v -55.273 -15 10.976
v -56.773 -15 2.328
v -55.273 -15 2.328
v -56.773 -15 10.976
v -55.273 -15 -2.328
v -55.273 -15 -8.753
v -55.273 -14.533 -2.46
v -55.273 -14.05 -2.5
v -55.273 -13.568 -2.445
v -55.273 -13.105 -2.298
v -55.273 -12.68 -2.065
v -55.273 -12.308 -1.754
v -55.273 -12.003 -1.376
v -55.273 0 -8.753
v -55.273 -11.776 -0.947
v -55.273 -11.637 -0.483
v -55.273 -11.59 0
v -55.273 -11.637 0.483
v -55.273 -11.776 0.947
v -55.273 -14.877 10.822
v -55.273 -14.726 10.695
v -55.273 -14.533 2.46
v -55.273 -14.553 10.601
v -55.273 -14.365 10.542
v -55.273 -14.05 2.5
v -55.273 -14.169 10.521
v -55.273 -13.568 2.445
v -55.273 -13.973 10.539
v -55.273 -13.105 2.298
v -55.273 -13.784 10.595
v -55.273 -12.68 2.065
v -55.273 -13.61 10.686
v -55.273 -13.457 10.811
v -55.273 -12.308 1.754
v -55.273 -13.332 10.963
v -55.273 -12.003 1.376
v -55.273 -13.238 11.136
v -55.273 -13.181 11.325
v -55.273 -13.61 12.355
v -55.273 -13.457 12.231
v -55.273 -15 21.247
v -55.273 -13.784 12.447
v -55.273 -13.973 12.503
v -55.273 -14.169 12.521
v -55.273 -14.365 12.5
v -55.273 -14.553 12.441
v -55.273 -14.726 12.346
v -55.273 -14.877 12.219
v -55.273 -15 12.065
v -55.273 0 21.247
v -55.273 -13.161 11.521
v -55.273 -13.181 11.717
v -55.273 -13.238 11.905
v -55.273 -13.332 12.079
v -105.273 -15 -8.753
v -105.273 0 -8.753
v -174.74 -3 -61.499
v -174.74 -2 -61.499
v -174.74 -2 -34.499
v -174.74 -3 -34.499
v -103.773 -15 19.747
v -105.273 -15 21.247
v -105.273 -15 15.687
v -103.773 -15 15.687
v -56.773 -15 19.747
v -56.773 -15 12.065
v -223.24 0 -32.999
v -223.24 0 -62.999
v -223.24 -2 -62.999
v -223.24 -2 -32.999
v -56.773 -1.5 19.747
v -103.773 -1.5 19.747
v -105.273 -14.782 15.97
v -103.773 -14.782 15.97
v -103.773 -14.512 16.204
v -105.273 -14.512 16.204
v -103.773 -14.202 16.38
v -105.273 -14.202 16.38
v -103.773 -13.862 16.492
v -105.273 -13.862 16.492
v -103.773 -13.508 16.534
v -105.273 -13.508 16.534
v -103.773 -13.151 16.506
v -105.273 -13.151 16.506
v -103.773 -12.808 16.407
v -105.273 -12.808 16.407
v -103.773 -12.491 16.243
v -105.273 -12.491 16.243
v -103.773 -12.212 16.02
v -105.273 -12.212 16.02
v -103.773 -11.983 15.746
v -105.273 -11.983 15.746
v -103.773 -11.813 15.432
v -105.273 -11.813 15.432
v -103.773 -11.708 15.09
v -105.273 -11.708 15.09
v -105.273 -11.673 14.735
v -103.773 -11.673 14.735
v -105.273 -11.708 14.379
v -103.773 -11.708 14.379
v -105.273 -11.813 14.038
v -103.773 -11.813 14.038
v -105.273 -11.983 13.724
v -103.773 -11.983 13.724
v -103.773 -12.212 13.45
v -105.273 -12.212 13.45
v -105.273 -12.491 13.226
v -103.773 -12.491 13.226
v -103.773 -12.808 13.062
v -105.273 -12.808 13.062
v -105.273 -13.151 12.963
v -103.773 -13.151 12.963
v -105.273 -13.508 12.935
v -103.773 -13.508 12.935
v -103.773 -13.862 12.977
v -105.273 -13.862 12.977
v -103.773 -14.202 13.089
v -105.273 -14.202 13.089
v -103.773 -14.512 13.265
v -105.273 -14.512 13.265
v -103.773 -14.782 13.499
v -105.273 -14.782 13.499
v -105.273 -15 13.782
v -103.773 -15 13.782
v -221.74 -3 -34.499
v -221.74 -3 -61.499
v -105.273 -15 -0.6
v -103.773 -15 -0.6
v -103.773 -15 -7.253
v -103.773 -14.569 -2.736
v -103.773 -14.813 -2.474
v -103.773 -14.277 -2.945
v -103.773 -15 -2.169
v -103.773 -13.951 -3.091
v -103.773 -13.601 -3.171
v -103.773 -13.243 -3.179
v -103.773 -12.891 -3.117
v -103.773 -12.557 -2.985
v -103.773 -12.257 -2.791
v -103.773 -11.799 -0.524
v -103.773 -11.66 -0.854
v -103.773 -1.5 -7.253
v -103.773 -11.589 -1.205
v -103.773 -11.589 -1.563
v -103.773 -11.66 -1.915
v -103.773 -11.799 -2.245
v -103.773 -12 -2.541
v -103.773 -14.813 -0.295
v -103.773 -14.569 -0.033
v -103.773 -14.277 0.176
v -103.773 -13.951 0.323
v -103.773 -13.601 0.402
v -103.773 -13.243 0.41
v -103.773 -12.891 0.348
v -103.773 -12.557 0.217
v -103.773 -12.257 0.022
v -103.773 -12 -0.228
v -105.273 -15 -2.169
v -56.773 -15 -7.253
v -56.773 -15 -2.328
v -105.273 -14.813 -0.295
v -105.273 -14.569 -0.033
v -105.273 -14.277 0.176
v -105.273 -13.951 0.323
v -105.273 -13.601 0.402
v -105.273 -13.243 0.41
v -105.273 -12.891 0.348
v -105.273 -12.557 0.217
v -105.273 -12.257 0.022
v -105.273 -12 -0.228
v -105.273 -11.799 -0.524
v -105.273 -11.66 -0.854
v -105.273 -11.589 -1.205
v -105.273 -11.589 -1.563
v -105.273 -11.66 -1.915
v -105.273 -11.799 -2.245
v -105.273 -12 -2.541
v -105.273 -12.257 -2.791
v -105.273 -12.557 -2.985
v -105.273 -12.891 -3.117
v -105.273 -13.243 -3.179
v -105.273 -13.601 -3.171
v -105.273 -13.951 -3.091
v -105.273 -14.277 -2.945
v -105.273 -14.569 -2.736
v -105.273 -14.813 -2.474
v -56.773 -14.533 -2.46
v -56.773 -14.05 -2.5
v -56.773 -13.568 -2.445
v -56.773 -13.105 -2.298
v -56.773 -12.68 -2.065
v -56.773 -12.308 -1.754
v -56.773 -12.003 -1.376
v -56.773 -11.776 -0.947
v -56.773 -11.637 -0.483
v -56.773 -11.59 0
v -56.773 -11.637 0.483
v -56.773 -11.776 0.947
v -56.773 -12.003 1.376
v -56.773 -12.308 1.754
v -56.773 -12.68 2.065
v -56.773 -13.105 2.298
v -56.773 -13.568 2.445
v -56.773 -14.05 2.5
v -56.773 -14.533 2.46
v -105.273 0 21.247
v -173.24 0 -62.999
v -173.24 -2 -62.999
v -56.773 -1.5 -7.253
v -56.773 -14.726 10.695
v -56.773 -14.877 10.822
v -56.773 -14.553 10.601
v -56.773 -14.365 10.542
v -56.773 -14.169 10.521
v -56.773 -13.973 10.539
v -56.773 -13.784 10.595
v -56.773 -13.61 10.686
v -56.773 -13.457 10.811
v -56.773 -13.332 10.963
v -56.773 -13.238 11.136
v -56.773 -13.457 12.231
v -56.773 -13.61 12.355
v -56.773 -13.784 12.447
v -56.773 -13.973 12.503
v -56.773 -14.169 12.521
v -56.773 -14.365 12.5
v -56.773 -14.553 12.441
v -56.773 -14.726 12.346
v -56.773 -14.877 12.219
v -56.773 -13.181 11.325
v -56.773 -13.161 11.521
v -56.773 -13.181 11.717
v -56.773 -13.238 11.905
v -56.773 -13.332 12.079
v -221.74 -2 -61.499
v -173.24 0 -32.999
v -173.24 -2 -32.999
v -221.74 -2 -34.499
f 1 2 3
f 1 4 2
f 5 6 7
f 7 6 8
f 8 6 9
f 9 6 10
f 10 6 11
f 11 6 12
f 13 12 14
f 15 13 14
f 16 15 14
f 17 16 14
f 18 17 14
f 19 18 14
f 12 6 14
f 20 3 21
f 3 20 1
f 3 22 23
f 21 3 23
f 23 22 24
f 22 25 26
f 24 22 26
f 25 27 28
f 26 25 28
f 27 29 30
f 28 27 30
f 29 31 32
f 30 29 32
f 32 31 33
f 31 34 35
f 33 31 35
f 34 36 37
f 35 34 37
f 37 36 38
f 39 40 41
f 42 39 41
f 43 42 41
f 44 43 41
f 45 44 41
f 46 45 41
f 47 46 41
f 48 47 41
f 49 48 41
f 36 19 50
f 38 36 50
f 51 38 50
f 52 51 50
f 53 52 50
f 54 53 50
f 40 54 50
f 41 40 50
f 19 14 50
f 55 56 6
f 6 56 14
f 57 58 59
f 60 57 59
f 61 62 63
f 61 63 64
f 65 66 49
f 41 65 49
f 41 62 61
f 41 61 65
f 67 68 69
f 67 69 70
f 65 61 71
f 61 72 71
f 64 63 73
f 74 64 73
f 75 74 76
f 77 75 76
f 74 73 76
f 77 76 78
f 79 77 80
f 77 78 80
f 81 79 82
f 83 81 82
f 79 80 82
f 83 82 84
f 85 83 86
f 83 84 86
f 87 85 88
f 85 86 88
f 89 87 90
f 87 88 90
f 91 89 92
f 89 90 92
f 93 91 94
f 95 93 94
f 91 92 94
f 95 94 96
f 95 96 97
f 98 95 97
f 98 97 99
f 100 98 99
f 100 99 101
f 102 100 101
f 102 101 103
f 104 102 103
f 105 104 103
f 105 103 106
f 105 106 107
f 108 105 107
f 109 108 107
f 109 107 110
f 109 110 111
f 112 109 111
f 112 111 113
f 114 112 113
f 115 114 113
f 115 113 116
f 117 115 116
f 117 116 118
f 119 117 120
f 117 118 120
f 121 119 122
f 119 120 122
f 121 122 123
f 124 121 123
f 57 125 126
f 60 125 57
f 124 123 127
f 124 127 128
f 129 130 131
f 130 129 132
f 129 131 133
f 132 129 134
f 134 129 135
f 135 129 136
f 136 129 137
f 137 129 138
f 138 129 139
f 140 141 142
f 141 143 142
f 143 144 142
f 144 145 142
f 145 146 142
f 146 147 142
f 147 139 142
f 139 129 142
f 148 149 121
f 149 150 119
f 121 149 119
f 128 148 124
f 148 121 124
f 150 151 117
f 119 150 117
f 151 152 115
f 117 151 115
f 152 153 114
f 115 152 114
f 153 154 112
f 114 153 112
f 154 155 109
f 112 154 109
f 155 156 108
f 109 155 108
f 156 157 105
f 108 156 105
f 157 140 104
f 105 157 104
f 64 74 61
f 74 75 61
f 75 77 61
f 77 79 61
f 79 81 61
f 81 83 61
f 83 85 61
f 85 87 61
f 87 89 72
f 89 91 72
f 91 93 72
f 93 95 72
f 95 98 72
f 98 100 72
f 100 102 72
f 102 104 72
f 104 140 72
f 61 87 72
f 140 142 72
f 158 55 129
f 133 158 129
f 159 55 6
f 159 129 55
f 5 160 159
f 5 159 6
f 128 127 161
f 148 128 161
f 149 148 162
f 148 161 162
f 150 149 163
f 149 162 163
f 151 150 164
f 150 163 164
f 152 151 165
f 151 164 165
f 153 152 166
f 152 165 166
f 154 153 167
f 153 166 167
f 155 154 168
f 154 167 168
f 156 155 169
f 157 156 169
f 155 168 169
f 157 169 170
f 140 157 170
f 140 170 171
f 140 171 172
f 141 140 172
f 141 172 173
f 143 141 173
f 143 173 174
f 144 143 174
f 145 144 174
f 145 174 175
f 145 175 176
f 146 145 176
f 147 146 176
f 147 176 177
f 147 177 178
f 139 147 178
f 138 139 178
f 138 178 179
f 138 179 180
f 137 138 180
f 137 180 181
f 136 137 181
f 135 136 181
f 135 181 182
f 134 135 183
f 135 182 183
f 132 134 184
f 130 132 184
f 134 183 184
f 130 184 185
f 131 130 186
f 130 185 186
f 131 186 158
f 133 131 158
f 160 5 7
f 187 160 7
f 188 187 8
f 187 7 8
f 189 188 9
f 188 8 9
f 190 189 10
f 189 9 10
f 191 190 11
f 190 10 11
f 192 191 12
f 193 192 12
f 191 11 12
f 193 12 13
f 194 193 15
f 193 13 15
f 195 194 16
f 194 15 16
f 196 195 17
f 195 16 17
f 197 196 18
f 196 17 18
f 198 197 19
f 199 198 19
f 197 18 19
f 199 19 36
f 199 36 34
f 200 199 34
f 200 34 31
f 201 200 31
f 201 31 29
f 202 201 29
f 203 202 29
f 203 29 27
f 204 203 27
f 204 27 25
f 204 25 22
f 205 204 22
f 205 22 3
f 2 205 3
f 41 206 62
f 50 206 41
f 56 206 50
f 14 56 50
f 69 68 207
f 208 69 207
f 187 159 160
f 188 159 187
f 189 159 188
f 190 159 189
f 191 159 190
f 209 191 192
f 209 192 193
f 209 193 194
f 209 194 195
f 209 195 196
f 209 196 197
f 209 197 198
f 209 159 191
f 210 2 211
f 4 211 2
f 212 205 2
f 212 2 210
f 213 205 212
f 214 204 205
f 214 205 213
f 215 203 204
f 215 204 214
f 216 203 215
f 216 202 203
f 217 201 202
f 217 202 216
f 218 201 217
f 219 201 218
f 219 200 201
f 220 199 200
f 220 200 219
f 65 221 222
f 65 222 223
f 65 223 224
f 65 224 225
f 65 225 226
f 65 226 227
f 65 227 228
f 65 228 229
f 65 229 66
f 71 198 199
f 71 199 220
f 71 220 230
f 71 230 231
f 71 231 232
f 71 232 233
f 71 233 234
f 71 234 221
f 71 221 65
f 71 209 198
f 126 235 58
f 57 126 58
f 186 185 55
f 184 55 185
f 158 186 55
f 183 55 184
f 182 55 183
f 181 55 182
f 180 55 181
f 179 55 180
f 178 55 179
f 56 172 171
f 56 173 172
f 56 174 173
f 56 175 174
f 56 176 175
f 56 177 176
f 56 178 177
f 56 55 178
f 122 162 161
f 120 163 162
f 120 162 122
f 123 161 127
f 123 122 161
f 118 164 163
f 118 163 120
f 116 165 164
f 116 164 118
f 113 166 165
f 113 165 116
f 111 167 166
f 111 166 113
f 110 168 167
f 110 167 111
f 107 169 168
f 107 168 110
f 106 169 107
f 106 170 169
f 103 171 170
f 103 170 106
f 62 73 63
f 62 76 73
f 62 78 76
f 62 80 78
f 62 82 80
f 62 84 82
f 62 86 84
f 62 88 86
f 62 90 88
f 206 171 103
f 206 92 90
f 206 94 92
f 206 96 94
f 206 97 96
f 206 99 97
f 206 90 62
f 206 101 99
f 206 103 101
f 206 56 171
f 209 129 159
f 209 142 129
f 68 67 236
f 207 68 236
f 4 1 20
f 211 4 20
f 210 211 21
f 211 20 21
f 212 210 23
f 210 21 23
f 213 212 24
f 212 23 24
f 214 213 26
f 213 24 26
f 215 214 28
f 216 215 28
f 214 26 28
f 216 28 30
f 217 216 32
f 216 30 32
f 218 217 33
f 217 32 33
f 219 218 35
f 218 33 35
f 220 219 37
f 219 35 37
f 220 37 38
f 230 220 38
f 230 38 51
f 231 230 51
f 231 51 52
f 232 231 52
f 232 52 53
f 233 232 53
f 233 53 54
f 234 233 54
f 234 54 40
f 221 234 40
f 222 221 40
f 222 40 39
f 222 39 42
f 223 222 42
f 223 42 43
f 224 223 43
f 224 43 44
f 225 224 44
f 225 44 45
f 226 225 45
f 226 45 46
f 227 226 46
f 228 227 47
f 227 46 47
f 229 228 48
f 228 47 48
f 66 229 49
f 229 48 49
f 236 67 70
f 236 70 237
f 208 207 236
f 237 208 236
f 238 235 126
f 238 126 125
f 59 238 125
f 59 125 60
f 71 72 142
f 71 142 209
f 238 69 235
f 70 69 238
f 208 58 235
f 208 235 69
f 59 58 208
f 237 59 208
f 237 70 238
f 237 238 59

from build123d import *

# Parameters (mm, degrees)
F0_W     = 50
F0_H     = 30
F1_DEPTH = 15
F2_T     = -1.5
F3_DEPTH = 2
F4_T     = -1.5
F5_DEPTH = 1.5
F7_DEPTH = 5
F9_DEPTH = 5


with BuildPart() as f1:
    # F0 (on Front) → F1 (new body)
    with BuildSketch(Plane.XZ):
        with Locations((-80.2725559641, 6.2470277771)):
            Rectangle(F0_W, F0_H)
    extrude(amount=F1_DEPTH)

    # F2
    f2_openings = [f1.faces().sort_by_distance(p)[0] for p in [
        (-80.272556, -15, 6.247028),
    ]]
    offset(amount=F2_T, openings=f2_openings)

    # F6 (on face) → F7 (cut)
    with BuildSketch(Plane(origin=(-105.2725559641, 0, 0), x_dir=(0, -1, 0), z_dir=(-1, 0, 0))):
        with BuildLine():
            Line((15, -2.1687817886), (15, -0.5999612961))
            ThreePointArc((15, -0.5999612961), (11.5799072355, -1.3843715424), (15, -2.1687817886))
        make_face()
        with BuildLine():
            Line((15, 13.7823199704), (15, 15.6869260744))
            ThreePointArc((15, 15.6869260744), (11.6725449607, 14.7346230224), (15, 13.7823199704))
        make_face()
    extrude(amount=-F7_DEPTH, mode=Mode.SUBTRACT)

    # F8 (on face) → F9 (cut)
    with BuildSketch(Plane.YZ.offset(-55.2725559641)):
        with BuildLine():
            Line((-15, 2.3284412038), (-15, -2.3284412038))
            ThreePointArc((-15, -2.3284412038), (-11.5898562968, 0), (-15, 2.3284412038))
        make_face()
        with BuildLine():
            Line((-15, 12.065316385), (-15, 10.9761349648))
            ThreePointArc((-15, 10.9761349648), (-13.1612980515, 11.5207256749), (-15, 12.065316385))
        make_face()
    extrude(amount=-F9_DEPTH, mode=Mode.SUBTRACT)


with BuildPart() as f3:
    # F0 (on Front) → F3 (new body)
    with BuildSketch(Plane.XZ):
        with Locations((-198.2397586107, -47.9986146092)):
            Rectangle(F0_W, F0_H)
    extrude(amount=F3_DEPTH)

    # F4
    f4_openings = [f3.faces().sort_by_distance(p)[0] for p in [
        (-198.239759, -2, -47.998615),
    ]]
    offset(amount=F4_T, openings=f4_openings)

    # F5 (add): a face of the model
    f5_faces = [f3.faces().sort_by_distance(p)[0] for p in [
        (-198.2397586107, -1.5, -47.9986146092),
    ]]
    extrude(f5_faces, amount=F5_DEPTH)


solid = Compound([f1.part, f3.part])
